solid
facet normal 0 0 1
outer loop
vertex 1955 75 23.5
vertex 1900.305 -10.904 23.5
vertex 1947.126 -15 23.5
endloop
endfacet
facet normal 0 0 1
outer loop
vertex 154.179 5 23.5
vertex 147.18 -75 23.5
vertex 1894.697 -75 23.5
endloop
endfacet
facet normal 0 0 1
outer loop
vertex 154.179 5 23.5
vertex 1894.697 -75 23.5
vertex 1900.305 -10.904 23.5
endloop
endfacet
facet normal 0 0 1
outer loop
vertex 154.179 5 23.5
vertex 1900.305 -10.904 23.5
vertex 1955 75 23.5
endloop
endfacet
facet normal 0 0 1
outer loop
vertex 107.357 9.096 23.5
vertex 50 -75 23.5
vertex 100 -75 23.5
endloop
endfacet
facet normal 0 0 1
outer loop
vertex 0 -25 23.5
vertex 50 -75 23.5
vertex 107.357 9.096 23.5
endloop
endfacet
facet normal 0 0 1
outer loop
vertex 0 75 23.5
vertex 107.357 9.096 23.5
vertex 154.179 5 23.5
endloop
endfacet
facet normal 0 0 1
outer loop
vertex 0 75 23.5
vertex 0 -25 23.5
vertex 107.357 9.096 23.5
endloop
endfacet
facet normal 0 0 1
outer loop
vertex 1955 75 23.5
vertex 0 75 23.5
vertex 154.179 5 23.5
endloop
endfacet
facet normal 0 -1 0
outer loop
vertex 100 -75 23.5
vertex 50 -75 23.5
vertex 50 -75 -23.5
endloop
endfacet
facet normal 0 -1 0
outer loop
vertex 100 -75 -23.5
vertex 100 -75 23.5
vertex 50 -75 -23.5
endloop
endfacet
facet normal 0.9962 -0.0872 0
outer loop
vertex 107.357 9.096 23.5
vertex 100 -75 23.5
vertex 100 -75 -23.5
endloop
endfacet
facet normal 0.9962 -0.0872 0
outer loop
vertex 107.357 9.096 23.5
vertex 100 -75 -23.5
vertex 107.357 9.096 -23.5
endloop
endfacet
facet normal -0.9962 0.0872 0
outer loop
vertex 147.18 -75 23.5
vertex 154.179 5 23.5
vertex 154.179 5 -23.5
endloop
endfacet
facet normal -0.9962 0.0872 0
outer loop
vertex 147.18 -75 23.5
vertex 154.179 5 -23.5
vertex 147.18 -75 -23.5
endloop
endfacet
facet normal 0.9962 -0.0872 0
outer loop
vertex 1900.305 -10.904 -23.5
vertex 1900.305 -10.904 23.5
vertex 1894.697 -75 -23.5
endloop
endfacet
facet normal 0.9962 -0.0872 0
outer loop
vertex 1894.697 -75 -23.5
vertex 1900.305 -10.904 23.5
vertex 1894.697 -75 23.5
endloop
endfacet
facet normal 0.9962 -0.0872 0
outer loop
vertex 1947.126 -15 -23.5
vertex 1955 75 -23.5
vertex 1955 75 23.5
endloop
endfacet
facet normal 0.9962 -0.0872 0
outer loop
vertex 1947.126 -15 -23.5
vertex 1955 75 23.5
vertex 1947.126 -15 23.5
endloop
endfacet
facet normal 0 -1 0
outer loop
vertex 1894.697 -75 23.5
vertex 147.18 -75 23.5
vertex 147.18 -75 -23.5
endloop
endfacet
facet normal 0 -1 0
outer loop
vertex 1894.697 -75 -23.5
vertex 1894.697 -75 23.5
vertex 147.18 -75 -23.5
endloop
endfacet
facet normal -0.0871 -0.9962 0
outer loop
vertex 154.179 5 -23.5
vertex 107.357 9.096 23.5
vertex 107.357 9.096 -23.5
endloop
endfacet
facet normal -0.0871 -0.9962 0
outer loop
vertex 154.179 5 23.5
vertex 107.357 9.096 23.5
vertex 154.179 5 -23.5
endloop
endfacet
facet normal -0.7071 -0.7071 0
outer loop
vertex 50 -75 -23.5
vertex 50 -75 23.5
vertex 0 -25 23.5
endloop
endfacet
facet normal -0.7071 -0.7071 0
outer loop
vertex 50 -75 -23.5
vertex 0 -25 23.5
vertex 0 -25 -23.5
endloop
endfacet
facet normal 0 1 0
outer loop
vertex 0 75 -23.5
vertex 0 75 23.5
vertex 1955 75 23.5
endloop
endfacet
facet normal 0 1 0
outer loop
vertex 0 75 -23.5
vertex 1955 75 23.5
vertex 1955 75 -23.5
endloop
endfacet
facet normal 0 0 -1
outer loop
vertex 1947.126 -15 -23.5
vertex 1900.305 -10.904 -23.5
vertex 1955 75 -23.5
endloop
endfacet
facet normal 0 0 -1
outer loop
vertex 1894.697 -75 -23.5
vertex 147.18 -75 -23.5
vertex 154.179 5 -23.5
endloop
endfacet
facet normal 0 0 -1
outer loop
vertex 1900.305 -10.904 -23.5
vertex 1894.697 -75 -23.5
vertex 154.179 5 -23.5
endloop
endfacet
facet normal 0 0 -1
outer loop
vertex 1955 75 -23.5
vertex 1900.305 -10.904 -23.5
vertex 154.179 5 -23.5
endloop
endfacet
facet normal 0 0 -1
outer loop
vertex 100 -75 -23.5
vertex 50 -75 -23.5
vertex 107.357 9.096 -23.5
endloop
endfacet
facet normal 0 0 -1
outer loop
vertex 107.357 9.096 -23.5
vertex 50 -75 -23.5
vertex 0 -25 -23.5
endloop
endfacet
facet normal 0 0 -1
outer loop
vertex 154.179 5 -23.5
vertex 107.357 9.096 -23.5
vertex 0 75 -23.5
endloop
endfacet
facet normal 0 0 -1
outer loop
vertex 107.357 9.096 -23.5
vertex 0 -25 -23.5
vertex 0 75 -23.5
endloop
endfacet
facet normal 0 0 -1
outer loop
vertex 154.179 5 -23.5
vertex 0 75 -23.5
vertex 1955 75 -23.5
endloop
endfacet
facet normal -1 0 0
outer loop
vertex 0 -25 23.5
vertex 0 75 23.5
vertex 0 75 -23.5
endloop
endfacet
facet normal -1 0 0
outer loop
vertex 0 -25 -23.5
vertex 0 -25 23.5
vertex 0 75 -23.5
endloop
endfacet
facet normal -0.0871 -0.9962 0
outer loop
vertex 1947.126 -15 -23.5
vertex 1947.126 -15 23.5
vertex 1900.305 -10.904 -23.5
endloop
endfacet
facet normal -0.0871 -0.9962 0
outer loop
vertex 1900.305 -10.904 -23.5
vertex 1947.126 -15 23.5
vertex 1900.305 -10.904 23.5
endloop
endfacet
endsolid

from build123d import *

# Parameters (mm, degrees)
SKETCH1_W           = 47
SKETCH1_H           = 150
BOSS_EXTRUDE1_DEPTH = 1955
CUT_EXTRUDE1_DEPTH  = 1958.002554929
CHAMFER1_SIZE       = 50
CUT_EXTRUDE2_DEPTH  = 1958.002554929
CUT_EXTRUDE3_DEPTH  = 1958.002554929


with BuildPart() as part:
    # Sketch1 → Boss-Extrude1 (new body)
    with BuildSketch(Plane(origin=(0, 0, 0), x_dir=(0, 0, -1), z_dir=(1, 0, 0))):
        Rectangle(SKETCH1_W, SKETCH1_H)
    extrude(amount=BOSS_EXTRUDE1_DEPTH)

    # Sketch2 → Cut-Extrude1 (cut, through all)
    with BuildSketch(Plane.XY.offset(23.5)):
        Polygon((100, -75), (107.357474636, 9.096319909), (154.178625447, 5), (147.179532365, -75), align=None)
    extrude(amount=-CUT_EXTRUDE1_DEPTH, mode=Mode.SUBTRACT)

    # Chamfer1
    chamfer1_edges = [part.edges().sort_by_distance(p)[0] for p in [
        (0, -75, 0),
    ]]
    chamfer(chamfer1_edges, length=CHAMFER1_SIZE)

    # Sketch3 → Cut-Extrude2 (cut, through all)
    with BuildSketch(Plane(origin=(0, 0, -23.5), x_dir=(-1, 0, 0), z_dir=(0, 0, -1))):
        Polygon((-1955, 75), (-1941.876700471, -75), (-1955, -75), align=None)
    extrude(amount=-CUT_EXTRUDE2_DEPTH, mode=Mode.SUBTRACT)

    # Sketch4 → Cut-Extrude3 (cut, through all)
    with BuildSketch(Plane.XY.offset(23.5)):
        Polygon((1947.126020283, -15), (1900.304869472, -10.903680091), (1894.697168107, -75), (1941.876700471, -75), align=None)
    extrude(amount=-CUT_EXTRUDE3_DEPTH, mode=Mode.SUBTRACT)


solid = part.part
